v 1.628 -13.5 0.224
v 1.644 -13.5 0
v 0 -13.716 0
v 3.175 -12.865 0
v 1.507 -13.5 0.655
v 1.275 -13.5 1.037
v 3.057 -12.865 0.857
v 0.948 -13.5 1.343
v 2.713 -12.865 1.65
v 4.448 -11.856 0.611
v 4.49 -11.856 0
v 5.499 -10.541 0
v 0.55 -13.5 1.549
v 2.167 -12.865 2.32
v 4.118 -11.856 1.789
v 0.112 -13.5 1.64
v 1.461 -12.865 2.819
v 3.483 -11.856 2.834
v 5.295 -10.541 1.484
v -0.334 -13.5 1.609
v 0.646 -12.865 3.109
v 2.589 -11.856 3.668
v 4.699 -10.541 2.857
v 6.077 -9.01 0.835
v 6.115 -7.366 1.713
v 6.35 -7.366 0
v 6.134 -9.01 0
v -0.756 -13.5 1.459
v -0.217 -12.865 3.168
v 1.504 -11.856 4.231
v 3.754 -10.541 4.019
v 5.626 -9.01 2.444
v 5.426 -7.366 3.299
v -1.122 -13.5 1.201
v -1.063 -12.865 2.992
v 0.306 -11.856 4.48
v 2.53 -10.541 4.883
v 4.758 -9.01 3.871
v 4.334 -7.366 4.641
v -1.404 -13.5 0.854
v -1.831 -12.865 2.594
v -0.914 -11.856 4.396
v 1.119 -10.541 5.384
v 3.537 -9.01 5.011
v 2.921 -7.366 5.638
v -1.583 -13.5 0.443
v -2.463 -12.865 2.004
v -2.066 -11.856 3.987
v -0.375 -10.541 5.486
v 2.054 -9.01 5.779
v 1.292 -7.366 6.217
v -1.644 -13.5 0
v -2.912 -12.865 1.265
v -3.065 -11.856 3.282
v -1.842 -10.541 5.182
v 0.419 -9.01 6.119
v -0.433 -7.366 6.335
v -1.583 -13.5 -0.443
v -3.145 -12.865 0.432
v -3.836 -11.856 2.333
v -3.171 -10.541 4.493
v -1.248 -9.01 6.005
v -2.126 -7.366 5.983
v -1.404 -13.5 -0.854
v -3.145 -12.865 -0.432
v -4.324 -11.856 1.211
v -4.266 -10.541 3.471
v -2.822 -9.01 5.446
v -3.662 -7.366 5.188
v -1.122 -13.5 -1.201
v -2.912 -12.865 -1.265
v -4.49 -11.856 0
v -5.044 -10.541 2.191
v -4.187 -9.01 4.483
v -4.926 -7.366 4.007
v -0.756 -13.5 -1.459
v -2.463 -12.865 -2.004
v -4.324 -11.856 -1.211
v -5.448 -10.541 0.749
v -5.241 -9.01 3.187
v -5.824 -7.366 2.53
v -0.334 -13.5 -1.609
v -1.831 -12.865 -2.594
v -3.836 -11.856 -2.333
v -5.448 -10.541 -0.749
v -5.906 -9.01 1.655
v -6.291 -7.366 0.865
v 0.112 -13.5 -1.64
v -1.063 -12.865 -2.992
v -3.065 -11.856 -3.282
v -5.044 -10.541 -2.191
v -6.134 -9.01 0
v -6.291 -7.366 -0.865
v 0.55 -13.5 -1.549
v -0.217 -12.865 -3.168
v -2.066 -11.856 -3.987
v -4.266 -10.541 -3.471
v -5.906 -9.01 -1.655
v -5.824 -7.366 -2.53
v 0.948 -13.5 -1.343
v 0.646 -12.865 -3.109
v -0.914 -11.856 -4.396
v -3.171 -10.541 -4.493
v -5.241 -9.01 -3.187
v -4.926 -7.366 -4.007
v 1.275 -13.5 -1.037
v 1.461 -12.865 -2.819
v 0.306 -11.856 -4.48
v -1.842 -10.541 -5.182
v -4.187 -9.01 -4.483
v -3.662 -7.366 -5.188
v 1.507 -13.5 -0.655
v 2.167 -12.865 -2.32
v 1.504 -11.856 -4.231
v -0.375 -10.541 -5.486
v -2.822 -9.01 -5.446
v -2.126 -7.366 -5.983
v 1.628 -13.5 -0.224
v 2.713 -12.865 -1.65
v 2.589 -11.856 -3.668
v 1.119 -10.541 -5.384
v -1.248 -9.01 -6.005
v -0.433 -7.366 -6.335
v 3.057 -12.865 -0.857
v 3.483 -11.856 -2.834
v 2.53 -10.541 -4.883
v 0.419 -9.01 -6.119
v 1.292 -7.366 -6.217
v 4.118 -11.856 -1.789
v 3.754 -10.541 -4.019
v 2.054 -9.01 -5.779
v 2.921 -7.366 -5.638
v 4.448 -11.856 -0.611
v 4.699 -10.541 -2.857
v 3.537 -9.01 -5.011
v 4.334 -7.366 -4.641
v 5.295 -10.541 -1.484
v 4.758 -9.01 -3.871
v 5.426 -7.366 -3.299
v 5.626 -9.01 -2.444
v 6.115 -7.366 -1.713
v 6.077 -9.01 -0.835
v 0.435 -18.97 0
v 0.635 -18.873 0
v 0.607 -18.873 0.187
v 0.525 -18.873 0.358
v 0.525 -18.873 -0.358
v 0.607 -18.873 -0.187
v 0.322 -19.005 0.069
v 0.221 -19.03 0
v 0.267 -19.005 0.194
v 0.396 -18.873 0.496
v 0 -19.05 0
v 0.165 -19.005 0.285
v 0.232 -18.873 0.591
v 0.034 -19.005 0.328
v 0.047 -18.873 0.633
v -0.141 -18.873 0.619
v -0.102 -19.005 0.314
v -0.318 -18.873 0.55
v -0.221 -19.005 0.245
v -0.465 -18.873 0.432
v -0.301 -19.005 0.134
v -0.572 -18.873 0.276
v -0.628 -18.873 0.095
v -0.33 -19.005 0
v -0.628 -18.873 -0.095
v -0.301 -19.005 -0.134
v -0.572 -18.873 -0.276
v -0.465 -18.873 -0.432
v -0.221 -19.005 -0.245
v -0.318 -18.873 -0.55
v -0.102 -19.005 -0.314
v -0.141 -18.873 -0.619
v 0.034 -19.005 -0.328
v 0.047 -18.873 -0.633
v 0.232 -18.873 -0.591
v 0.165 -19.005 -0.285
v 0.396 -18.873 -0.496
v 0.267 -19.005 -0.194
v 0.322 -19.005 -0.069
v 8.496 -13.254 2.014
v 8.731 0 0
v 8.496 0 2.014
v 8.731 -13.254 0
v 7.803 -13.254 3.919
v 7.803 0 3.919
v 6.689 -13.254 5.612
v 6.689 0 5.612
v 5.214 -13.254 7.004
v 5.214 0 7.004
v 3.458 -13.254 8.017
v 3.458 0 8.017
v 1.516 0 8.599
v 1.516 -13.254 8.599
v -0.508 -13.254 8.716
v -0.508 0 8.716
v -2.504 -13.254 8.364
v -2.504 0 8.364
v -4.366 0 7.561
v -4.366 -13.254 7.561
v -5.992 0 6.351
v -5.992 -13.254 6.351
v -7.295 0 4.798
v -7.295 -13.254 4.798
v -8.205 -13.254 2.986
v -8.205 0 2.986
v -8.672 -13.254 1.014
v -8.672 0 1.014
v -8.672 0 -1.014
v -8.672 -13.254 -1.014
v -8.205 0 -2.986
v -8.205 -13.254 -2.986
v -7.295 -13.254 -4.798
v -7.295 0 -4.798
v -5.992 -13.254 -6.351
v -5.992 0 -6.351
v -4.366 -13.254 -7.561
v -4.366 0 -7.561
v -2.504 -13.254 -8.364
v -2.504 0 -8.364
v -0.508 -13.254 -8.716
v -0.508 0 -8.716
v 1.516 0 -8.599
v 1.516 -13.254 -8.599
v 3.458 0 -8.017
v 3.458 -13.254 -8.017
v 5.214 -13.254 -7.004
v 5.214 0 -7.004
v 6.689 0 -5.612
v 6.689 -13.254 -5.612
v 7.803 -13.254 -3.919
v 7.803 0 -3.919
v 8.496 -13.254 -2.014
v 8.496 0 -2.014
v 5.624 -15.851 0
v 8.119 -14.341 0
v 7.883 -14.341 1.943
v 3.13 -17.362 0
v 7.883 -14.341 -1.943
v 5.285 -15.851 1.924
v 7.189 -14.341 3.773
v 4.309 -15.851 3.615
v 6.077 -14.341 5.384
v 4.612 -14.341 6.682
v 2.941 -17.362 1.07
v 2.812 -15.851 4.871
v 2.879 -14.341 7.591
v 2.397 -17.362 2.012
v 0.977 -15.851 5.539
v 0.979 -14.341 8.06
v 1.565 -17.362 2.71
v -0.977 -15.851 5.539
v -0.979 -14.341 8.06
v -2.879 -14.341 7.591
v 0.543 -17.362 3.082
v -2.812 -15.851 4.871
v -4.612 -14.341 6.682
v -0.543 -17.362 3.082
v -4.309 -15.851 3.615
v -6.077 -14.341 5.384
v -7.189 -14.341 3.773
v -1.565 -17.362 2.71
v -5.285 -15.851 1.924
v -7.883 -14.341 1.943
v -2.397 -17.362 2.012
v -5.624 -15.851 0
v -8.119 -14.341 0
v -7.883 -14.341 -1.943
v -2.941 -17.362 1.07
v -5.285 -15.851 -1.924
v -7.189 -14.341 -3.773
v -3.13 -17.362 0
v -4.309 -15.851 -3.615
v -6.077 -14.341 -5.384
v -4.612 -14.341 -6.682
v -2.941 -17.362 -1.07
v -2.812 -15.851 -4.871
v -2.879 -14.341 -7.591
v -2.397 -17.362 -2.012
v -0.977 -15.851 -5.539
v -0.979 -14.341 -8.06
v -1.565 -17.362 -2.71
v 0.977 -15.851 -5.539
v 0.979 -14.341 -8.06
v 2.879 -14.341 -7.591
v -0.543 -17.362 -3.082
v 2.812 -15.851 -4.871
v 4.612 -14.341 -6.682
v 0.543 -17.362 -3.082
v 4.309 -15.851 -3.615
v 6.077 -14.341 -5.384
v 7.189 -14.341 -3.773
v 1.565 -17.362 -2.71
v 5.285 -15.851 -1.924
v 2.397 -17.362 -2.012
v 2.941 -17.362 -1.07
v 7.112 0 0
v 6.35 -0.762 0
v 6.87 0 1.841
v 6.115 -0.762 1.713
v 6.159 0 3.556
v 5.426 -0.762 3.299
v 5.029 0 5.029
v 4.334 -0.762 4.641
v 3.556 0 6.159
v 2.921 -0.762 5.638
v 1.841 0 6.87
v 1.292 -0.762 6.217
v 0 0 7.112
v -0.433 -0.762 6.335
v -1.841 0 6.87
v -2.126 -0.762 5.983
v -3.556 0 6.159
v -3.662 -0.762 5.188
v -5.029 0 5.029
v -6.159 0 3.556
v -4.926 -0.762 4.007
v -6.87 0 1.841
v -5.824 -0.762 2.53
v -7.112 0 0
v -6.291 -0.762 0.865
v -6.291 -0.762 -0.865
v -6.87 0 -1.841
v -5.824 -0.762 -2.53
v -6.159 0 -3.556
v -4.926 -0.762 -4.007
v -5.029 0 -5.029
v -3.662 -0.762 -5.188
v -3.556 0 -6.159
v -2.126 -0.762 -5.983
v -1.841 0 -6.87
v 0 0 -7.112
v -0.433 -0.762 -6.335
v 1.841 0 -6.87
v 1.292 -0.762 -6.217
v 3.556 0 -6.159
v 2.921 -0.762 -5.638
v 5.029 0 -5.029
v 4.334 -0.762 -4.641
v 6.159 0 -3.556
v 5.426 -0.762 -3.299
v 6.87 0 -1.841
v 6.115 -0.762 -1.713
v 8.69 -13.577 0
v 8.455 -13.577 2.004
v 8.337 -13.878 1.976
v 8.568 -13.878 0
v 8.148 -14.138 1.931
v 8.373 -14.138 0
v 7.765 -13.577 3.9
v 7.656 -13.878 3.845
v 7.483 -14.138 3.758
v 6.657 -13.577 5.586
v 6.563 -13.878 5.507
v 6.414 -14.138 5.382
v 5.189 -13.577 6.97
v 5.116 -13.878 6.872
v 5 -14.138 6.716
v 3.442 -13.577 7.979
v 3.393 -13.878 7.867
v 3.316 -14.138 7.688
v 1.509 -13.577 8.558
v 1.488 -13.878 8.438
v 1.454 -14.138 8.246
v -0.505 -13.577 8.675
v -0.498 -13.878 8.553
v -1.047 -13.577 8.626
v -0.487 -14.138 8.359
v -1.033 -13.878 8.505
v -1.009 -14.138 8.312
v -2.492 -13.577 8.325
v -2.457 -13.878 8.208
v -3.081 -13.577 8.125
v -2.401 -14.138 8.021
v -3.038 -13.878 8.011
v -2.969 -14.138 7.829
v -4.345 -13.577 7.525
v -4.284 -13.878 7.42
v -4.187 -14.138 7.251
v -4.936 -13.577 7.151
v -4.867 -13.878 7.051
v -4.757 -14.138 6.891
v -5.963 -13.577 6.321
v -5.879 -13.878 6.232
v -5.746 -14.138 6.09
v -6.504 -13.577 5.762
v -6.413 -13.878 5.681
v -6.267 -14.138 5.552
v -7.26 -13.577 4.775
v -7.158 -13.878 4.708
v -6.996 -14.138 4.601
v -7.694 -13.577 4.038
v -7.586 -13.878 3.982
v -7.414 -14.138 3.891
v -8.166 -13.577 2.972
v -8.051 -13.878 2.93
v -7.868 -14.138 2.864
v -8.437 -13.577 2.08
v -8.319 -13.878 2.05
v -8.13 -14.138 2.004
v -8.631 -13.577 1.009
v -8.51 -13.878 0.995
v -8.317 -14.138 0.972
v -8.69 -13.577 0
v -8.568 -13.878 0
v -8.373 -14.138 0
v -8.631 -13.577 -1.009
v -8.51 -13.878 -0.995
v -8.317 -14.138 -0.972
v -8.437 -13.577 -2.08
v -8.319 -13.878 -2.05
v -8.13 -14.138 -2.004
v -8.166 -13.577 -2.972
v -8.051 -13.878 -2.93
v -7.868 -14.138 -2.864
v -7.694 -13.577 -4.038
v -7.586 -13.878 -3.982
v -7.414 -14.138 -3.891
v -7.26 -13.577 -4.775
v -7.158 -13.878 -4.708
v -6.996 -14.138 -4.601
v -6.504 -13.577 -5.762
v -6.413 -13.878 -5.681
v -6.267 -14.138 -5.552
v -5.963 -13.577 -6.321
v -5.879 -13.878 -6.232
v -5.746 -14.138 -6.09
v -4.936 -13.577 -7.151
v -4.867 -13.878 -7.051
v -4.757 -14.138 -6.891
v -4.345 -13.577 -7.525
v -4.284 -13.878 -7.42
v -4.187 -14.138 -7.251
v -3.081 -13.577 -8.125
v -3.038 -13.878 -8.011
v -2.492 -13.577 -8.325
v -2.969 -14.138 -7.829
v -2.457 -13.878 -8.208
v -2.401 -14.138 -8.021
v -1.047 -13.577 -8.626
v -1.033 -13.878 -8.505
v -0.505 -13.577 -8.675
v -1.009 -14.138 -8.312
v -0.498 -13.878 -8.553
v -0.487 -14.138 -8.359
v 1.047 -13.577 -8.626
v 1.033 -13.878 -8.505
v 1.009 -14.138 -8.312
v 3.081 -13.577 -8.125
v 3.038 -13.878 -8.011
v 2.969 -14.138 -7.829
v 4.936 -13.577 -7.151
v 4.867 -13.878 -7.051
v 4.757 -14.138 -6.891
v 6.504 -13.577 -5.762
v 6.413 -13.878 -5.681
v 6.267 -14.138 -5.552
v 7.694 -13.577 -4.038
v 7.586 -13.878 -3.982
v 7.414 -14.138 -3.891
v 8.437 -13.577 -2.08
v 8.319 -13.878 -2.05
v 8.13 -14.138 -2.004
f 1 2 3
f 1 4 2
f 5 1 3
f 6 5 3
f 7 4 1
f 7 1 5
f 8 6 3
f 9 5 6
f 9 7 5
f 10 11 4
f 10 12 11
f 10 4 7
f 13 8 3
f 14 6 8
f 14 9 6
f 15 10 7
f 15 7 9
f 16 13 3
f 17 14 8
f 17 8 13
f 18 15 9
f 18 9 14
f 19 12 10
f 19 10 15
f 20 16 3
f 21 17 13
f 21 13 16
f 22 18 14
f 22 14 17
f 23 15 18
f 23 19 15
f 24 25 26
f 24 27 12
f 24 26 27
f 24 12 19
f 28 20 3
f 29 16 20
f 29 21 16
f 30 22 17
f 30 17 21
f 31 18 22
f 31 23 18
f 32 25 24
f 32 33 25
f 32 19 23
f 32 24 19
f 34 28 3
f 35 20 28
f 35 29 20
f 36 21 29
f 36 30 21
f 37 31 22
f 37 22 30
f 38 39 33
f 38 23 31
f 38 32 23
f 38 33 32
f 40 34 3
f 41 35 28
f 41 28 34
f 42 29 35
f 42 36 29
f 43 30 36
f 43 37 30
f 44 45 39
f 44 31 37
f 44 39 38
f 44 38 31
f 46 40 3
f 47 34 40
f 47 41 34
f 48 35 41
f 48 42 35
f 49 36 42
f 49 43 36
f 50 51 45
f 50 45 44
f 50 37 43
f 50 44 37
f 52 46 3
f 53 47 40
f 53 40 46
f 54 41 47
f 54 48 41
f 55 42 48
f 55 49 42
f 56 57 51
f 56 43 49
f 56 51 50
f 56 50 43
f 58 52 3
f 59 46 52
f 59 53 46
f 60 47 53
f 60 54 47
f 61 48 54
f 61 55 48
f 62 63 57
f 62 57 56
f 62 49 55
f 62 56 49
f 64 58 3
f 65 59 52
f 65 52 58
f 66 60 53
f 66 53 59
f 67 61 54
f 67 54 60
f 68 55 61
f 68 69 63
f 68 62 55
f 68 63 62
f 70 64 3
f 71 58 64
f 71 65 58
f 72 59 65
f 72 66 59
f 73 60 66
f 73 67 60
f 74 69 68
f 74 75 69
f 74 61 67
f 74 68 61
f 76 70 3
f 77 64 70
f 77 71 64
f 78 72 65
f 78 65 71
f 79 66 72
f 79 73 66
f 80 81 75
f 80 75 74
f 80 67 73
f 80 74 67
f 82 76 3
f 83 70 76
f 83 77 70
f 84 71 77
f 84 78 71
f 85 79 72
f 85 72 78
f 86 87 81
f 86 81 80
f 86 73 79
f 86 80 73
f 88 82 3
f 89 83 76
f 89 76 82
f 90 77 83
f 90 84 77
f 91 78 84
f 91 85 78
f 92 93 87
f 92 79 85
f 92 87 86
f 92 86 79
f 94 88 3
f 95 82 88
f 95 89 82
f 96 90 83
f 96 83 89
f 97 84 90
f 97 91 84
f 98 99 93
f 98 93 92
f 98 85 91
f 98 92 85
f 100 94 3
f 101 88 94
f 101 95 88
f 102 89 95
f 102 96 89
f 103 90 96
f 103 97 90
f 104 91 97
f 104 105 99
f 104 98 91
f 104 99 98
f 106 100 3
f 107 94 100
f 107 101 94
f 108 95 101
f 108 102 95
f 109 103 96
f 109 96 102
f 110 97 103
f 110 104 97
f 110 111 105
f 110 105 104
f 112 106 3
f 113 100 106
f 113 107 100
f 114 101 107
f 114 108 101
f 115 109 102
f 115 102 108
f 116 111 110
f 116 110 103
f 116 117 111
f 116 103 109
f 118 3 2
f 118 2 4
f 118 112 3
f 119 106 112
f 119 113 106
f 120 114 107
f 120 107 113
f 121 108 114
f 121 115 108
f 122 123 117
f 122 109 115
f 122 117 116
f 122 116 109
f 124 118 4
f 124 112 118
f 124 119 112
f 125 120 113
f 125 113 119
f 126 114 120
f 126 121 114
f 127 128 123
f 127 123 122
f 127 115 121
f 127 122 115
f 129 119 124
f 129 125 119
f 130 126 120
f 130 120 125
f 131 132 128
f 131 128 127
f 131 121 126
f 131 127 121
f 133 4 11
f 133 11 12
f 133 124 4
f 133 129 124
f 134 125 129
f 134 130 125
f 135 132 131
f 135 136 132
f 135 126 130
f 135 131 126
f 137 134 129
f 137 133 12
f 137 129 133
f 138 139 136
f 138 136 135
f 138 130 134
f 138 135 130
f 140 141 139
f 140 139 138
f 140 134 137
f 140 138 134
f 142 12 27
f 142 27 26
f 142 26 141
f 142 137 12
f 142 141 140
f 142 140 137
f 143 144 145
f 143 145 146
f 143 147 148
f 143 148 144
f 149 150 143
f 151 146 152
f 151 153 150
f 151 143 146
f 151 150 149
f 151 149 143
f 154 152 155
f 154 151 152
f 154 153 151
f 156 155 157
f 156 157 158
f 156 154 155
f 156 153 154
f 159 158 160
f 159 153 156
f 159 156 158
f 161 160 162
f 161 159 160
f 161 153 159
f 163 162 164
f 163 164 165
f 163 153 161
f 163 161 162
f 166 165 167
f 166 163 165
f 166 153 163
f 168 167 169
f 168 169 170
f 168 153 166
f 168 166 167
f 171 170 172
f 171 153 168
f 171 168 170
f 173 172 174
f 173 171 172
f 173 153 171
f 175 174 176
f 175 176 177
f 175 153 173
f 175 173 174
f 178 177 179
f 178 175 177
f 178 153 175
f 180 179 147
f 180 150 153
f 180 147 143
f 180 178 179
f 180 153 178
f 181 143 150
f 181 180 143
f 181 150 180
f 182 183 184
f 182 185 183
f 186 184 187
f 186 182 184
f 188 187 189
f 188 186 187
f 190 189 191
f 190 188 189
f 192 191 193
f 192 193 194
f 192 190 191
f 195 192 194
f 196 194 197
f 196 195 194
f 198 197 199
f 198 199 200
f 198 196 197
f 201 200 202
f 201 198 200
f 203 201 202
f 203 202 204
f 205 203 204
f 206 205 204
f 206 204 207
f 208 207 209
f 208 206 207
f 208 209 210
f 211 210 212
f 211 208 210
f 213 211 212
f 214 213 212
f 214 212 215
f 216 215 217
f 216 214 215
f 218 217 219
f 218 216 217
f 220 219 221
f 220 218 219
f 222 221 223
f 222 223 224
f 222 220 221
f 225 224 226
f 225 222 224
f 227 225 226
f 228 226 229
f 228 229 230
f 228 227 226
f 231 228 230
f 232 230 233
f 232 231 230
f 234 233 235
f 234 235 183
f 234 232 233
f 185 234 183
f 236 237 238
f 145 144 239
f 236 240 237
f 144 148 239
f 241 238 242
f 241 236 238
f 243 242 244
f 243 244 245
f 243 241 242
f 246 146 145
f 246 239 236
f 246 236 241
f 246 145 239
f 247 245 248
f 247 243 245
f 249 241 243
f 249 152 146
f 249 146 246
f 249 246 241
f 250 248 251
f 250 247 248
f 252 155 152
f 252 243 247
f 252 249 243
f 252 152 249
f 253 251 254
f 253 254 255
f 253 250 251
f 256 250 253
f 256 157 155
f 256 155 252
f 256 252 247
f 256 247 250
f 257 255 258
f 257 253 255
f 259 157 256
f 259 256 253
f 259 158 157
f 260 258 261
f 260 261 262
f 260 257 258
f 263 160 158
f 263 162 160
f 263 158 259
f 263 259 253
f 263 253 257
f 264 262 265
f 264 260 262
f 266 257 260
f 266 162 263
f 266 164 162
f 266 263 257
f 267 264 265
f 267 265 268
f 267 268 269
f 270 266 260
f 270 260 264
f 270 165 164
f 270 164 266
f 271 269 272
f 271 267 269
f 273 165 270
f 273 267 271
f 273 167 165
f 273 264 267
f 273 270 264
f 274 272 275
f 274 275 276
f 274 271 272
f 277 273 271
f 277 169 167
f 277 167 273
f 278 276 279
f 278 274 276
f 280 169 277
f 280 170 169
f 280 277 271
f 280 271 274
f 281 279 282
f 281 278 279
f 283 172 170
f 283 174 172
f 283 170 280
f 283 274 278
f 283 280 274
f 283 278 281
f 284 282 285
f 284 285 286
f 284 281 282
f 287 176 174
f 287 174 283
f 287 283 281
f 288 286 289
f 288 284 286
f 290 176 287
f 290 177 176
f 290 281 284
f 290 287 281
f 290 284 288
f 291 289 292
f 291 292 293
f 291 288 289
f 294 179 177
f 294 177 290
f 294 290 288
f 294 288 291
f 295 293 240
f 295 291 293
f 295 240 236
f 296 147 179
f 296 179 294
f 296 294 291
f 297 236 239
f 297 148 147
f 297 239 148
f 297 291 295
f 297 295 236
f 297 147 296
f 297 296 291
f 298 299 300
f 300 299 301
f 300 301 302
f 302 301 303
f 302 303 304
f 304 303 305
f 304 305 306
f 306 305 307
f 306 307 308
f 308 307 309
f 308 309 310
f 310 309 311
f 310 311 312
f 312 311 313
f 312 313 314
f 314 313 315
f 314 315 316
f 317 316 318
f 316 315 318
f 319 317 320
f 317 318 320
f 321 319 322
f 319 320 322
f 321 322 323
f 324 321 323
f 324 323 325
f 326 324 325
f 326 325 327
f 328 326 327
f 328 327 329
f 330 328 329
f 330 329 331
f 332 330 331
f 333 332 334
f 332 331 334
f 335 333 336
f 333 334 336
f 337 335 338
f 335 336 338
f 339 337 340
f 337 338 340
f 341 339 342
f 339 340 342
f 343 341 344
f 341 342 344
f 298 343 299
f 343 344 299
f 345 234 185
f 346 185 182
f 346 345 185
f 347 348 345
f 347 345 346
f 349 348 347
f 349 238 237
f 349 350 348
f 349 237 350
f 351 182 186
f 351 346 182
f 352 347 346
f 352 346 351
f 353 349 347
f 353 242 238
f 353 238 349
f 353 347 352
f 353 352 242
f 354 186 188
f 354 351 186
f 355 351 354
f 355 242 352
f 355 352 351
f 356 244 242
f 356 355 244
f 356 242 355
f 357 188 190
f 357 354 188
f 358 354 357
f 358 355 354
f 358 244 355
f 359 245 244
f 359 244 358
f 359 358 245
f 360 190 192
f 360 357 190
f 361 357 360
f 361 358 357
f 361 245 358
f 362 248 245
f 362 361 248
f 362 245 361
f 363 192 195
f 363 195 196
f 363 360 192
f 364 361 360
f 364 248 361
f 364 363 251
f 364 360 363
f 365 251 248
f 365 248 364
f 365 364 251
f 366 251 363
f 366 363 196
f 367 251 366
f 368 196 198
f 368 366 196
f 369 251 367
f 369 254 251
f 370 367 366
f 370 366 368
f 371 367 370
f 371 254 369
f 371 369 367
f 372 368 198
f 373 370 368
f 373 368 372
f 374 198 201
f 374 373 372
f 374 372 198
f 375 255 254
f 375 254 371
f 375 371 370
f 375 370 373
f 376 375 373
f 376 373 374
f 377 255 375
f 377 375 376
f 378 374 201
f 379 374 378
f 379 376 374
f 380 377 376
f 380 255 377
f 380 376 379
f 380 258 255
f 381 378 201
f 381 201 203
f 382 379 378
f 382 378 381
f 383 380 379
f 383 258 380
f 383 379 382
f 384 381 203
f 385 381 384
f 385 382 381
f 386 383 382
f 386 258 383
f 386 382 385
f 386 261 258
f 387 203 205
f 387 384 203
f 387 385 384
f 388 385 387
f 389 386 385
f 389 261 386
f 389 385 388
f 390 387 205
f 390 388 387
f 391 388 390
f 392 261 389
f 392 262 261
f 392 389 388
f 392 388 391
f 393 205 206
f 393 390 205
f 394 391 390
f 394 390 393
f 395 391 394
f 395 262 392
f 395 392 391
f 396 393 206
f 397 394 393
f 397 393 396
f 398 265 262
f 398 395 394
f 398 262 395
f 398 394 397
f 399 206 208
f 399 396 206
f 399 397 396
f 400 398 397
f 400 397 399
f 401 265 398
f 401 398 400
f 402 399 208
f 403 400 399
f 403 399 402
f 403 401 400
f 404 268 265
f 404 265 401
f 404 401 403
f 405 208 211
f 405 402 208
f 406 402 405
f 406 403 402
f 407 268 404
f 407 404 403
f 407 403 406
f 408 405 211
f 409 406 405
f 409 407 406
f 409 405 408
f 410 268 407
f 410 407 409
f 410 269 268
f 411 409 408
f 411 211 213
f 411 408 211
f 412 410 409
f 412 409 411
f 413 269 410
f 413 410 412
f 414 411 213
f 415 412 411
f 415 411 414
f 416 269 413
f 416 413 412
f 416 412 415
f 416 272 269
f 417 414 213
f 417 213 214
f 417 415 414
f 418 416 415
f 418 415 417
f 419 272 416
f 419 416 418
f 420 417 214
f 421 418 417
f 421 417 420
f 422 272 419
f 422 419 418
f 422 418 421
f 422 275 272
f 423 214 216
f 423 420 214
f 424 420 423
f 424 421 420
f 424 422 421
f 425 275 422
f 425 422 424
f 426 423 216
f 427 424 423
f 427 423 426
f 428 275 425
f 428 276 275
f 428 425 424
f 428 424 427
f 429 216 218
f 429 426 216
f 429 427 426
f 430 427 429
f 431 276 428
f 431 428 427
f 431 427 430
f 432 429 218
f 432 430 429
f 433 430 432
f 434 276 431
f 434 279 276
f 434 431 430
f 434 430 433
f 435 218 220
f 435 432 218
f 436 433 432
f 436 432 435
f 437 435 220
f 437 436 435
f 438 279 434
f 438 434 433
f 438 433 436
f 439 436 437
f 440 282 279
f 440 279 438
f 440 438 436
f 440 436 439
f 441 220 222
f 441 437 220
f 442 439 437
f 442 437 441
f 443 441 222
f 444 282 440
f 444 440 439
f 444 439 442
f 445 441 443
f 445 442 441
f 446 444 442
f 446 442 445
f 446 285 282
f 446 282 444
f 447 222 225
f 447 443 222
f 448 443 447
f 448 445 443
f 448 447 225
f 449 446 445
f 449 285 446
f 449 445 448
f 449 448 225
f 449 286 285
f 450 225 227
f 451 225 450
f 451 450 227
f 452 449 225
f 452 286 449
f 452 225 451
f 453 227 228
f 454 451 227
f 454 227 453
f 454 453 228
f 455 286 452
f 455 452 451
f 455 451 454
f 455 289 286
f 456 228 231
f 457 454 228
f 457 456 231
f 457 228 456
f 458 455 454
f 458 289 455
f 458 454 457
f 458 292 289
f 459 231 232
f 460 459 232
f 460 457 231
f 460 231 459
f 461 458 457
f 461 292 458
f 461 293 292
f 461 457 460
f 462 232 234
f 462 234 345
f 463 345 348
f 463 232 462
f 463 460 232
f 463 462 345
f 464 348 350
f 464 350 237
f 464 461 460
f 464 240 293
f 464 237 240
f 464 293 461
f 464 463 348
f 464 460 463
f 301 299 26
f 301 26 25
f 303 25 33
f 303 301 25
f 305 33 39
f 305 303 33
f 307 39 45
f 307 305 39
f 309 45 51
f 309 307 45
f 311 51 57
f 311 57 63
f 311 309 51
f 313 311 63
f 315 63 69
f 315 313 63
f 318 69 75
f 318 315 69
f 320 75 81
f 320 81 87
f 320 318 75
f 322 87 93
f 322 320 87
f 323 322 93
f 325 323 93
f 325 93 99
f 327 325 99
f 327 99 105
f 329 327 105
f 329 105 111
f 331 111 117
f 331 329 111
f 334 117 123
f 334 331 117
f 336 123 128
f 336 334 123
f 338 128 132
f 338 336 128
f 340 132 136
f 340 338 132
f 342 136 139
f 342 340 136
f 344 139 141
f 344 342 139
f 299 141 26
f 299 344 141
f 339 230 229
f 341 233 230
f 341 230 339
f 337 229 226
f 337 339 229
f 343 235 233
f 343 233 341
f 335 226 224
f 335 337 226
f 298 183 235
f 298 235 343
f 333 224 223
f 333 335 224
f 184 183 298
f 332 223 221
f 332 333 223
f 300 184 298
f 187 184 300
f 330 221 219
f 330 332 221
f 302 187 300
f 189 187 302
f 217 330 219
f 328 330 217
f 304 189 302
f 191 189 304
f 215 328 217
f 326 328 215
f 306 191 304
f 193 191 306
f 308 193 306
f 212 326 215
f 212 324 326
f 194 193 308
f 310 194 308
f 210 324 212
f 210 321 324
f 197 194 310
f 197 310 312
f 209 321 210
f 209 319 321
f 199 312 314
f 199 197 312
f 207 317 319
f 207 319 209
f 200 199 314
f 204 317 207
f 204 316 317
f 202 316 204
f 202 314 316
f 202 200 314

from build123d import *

# Parameters (mm, degrees)
CHAMFER1_SIZE = 0.762


with BuildPart() as part:
    # Sketch1 → Revolve1 (revolve)
    with BuildSketch(Plane.XY):
        with BuildLine():
            Line((6.35, 0), (8.73125, 0))
            Line((8.73125, 0), (8.73125, -13.25435082))
            ThreePointArc((8.73125, -13.25435082), (8.567676279, -13.87782567), (8.11909112, -14.340695636))
            Line((8.11909112, -14.340695636), (0.635, -18.872721569))
            ThreePointArc((0.635, -18.872721569), (0.329640957, -19.004848916), (0, -19.05))
            Line((0, -19.05), (0, -13.716))
            ThreePointArc((0, -13.716), (4.490128061, -11.856128061), (6.35, -7.366))
            Line((6.35, -7.366), (6.35, 0))
        make_face()
    revolve(axis=Axis((0, -13.716, 0), (0, -1, 0)))

    # Chamfer1
    chamfer1_edges = [part.edges().sort_by_distance(p)[0] for p in [
        (-6.35, 0, 0),
    ]]
    chamfer(chamfer1_edges, length=CHAMFER1_SIZE)


solid = part.part
